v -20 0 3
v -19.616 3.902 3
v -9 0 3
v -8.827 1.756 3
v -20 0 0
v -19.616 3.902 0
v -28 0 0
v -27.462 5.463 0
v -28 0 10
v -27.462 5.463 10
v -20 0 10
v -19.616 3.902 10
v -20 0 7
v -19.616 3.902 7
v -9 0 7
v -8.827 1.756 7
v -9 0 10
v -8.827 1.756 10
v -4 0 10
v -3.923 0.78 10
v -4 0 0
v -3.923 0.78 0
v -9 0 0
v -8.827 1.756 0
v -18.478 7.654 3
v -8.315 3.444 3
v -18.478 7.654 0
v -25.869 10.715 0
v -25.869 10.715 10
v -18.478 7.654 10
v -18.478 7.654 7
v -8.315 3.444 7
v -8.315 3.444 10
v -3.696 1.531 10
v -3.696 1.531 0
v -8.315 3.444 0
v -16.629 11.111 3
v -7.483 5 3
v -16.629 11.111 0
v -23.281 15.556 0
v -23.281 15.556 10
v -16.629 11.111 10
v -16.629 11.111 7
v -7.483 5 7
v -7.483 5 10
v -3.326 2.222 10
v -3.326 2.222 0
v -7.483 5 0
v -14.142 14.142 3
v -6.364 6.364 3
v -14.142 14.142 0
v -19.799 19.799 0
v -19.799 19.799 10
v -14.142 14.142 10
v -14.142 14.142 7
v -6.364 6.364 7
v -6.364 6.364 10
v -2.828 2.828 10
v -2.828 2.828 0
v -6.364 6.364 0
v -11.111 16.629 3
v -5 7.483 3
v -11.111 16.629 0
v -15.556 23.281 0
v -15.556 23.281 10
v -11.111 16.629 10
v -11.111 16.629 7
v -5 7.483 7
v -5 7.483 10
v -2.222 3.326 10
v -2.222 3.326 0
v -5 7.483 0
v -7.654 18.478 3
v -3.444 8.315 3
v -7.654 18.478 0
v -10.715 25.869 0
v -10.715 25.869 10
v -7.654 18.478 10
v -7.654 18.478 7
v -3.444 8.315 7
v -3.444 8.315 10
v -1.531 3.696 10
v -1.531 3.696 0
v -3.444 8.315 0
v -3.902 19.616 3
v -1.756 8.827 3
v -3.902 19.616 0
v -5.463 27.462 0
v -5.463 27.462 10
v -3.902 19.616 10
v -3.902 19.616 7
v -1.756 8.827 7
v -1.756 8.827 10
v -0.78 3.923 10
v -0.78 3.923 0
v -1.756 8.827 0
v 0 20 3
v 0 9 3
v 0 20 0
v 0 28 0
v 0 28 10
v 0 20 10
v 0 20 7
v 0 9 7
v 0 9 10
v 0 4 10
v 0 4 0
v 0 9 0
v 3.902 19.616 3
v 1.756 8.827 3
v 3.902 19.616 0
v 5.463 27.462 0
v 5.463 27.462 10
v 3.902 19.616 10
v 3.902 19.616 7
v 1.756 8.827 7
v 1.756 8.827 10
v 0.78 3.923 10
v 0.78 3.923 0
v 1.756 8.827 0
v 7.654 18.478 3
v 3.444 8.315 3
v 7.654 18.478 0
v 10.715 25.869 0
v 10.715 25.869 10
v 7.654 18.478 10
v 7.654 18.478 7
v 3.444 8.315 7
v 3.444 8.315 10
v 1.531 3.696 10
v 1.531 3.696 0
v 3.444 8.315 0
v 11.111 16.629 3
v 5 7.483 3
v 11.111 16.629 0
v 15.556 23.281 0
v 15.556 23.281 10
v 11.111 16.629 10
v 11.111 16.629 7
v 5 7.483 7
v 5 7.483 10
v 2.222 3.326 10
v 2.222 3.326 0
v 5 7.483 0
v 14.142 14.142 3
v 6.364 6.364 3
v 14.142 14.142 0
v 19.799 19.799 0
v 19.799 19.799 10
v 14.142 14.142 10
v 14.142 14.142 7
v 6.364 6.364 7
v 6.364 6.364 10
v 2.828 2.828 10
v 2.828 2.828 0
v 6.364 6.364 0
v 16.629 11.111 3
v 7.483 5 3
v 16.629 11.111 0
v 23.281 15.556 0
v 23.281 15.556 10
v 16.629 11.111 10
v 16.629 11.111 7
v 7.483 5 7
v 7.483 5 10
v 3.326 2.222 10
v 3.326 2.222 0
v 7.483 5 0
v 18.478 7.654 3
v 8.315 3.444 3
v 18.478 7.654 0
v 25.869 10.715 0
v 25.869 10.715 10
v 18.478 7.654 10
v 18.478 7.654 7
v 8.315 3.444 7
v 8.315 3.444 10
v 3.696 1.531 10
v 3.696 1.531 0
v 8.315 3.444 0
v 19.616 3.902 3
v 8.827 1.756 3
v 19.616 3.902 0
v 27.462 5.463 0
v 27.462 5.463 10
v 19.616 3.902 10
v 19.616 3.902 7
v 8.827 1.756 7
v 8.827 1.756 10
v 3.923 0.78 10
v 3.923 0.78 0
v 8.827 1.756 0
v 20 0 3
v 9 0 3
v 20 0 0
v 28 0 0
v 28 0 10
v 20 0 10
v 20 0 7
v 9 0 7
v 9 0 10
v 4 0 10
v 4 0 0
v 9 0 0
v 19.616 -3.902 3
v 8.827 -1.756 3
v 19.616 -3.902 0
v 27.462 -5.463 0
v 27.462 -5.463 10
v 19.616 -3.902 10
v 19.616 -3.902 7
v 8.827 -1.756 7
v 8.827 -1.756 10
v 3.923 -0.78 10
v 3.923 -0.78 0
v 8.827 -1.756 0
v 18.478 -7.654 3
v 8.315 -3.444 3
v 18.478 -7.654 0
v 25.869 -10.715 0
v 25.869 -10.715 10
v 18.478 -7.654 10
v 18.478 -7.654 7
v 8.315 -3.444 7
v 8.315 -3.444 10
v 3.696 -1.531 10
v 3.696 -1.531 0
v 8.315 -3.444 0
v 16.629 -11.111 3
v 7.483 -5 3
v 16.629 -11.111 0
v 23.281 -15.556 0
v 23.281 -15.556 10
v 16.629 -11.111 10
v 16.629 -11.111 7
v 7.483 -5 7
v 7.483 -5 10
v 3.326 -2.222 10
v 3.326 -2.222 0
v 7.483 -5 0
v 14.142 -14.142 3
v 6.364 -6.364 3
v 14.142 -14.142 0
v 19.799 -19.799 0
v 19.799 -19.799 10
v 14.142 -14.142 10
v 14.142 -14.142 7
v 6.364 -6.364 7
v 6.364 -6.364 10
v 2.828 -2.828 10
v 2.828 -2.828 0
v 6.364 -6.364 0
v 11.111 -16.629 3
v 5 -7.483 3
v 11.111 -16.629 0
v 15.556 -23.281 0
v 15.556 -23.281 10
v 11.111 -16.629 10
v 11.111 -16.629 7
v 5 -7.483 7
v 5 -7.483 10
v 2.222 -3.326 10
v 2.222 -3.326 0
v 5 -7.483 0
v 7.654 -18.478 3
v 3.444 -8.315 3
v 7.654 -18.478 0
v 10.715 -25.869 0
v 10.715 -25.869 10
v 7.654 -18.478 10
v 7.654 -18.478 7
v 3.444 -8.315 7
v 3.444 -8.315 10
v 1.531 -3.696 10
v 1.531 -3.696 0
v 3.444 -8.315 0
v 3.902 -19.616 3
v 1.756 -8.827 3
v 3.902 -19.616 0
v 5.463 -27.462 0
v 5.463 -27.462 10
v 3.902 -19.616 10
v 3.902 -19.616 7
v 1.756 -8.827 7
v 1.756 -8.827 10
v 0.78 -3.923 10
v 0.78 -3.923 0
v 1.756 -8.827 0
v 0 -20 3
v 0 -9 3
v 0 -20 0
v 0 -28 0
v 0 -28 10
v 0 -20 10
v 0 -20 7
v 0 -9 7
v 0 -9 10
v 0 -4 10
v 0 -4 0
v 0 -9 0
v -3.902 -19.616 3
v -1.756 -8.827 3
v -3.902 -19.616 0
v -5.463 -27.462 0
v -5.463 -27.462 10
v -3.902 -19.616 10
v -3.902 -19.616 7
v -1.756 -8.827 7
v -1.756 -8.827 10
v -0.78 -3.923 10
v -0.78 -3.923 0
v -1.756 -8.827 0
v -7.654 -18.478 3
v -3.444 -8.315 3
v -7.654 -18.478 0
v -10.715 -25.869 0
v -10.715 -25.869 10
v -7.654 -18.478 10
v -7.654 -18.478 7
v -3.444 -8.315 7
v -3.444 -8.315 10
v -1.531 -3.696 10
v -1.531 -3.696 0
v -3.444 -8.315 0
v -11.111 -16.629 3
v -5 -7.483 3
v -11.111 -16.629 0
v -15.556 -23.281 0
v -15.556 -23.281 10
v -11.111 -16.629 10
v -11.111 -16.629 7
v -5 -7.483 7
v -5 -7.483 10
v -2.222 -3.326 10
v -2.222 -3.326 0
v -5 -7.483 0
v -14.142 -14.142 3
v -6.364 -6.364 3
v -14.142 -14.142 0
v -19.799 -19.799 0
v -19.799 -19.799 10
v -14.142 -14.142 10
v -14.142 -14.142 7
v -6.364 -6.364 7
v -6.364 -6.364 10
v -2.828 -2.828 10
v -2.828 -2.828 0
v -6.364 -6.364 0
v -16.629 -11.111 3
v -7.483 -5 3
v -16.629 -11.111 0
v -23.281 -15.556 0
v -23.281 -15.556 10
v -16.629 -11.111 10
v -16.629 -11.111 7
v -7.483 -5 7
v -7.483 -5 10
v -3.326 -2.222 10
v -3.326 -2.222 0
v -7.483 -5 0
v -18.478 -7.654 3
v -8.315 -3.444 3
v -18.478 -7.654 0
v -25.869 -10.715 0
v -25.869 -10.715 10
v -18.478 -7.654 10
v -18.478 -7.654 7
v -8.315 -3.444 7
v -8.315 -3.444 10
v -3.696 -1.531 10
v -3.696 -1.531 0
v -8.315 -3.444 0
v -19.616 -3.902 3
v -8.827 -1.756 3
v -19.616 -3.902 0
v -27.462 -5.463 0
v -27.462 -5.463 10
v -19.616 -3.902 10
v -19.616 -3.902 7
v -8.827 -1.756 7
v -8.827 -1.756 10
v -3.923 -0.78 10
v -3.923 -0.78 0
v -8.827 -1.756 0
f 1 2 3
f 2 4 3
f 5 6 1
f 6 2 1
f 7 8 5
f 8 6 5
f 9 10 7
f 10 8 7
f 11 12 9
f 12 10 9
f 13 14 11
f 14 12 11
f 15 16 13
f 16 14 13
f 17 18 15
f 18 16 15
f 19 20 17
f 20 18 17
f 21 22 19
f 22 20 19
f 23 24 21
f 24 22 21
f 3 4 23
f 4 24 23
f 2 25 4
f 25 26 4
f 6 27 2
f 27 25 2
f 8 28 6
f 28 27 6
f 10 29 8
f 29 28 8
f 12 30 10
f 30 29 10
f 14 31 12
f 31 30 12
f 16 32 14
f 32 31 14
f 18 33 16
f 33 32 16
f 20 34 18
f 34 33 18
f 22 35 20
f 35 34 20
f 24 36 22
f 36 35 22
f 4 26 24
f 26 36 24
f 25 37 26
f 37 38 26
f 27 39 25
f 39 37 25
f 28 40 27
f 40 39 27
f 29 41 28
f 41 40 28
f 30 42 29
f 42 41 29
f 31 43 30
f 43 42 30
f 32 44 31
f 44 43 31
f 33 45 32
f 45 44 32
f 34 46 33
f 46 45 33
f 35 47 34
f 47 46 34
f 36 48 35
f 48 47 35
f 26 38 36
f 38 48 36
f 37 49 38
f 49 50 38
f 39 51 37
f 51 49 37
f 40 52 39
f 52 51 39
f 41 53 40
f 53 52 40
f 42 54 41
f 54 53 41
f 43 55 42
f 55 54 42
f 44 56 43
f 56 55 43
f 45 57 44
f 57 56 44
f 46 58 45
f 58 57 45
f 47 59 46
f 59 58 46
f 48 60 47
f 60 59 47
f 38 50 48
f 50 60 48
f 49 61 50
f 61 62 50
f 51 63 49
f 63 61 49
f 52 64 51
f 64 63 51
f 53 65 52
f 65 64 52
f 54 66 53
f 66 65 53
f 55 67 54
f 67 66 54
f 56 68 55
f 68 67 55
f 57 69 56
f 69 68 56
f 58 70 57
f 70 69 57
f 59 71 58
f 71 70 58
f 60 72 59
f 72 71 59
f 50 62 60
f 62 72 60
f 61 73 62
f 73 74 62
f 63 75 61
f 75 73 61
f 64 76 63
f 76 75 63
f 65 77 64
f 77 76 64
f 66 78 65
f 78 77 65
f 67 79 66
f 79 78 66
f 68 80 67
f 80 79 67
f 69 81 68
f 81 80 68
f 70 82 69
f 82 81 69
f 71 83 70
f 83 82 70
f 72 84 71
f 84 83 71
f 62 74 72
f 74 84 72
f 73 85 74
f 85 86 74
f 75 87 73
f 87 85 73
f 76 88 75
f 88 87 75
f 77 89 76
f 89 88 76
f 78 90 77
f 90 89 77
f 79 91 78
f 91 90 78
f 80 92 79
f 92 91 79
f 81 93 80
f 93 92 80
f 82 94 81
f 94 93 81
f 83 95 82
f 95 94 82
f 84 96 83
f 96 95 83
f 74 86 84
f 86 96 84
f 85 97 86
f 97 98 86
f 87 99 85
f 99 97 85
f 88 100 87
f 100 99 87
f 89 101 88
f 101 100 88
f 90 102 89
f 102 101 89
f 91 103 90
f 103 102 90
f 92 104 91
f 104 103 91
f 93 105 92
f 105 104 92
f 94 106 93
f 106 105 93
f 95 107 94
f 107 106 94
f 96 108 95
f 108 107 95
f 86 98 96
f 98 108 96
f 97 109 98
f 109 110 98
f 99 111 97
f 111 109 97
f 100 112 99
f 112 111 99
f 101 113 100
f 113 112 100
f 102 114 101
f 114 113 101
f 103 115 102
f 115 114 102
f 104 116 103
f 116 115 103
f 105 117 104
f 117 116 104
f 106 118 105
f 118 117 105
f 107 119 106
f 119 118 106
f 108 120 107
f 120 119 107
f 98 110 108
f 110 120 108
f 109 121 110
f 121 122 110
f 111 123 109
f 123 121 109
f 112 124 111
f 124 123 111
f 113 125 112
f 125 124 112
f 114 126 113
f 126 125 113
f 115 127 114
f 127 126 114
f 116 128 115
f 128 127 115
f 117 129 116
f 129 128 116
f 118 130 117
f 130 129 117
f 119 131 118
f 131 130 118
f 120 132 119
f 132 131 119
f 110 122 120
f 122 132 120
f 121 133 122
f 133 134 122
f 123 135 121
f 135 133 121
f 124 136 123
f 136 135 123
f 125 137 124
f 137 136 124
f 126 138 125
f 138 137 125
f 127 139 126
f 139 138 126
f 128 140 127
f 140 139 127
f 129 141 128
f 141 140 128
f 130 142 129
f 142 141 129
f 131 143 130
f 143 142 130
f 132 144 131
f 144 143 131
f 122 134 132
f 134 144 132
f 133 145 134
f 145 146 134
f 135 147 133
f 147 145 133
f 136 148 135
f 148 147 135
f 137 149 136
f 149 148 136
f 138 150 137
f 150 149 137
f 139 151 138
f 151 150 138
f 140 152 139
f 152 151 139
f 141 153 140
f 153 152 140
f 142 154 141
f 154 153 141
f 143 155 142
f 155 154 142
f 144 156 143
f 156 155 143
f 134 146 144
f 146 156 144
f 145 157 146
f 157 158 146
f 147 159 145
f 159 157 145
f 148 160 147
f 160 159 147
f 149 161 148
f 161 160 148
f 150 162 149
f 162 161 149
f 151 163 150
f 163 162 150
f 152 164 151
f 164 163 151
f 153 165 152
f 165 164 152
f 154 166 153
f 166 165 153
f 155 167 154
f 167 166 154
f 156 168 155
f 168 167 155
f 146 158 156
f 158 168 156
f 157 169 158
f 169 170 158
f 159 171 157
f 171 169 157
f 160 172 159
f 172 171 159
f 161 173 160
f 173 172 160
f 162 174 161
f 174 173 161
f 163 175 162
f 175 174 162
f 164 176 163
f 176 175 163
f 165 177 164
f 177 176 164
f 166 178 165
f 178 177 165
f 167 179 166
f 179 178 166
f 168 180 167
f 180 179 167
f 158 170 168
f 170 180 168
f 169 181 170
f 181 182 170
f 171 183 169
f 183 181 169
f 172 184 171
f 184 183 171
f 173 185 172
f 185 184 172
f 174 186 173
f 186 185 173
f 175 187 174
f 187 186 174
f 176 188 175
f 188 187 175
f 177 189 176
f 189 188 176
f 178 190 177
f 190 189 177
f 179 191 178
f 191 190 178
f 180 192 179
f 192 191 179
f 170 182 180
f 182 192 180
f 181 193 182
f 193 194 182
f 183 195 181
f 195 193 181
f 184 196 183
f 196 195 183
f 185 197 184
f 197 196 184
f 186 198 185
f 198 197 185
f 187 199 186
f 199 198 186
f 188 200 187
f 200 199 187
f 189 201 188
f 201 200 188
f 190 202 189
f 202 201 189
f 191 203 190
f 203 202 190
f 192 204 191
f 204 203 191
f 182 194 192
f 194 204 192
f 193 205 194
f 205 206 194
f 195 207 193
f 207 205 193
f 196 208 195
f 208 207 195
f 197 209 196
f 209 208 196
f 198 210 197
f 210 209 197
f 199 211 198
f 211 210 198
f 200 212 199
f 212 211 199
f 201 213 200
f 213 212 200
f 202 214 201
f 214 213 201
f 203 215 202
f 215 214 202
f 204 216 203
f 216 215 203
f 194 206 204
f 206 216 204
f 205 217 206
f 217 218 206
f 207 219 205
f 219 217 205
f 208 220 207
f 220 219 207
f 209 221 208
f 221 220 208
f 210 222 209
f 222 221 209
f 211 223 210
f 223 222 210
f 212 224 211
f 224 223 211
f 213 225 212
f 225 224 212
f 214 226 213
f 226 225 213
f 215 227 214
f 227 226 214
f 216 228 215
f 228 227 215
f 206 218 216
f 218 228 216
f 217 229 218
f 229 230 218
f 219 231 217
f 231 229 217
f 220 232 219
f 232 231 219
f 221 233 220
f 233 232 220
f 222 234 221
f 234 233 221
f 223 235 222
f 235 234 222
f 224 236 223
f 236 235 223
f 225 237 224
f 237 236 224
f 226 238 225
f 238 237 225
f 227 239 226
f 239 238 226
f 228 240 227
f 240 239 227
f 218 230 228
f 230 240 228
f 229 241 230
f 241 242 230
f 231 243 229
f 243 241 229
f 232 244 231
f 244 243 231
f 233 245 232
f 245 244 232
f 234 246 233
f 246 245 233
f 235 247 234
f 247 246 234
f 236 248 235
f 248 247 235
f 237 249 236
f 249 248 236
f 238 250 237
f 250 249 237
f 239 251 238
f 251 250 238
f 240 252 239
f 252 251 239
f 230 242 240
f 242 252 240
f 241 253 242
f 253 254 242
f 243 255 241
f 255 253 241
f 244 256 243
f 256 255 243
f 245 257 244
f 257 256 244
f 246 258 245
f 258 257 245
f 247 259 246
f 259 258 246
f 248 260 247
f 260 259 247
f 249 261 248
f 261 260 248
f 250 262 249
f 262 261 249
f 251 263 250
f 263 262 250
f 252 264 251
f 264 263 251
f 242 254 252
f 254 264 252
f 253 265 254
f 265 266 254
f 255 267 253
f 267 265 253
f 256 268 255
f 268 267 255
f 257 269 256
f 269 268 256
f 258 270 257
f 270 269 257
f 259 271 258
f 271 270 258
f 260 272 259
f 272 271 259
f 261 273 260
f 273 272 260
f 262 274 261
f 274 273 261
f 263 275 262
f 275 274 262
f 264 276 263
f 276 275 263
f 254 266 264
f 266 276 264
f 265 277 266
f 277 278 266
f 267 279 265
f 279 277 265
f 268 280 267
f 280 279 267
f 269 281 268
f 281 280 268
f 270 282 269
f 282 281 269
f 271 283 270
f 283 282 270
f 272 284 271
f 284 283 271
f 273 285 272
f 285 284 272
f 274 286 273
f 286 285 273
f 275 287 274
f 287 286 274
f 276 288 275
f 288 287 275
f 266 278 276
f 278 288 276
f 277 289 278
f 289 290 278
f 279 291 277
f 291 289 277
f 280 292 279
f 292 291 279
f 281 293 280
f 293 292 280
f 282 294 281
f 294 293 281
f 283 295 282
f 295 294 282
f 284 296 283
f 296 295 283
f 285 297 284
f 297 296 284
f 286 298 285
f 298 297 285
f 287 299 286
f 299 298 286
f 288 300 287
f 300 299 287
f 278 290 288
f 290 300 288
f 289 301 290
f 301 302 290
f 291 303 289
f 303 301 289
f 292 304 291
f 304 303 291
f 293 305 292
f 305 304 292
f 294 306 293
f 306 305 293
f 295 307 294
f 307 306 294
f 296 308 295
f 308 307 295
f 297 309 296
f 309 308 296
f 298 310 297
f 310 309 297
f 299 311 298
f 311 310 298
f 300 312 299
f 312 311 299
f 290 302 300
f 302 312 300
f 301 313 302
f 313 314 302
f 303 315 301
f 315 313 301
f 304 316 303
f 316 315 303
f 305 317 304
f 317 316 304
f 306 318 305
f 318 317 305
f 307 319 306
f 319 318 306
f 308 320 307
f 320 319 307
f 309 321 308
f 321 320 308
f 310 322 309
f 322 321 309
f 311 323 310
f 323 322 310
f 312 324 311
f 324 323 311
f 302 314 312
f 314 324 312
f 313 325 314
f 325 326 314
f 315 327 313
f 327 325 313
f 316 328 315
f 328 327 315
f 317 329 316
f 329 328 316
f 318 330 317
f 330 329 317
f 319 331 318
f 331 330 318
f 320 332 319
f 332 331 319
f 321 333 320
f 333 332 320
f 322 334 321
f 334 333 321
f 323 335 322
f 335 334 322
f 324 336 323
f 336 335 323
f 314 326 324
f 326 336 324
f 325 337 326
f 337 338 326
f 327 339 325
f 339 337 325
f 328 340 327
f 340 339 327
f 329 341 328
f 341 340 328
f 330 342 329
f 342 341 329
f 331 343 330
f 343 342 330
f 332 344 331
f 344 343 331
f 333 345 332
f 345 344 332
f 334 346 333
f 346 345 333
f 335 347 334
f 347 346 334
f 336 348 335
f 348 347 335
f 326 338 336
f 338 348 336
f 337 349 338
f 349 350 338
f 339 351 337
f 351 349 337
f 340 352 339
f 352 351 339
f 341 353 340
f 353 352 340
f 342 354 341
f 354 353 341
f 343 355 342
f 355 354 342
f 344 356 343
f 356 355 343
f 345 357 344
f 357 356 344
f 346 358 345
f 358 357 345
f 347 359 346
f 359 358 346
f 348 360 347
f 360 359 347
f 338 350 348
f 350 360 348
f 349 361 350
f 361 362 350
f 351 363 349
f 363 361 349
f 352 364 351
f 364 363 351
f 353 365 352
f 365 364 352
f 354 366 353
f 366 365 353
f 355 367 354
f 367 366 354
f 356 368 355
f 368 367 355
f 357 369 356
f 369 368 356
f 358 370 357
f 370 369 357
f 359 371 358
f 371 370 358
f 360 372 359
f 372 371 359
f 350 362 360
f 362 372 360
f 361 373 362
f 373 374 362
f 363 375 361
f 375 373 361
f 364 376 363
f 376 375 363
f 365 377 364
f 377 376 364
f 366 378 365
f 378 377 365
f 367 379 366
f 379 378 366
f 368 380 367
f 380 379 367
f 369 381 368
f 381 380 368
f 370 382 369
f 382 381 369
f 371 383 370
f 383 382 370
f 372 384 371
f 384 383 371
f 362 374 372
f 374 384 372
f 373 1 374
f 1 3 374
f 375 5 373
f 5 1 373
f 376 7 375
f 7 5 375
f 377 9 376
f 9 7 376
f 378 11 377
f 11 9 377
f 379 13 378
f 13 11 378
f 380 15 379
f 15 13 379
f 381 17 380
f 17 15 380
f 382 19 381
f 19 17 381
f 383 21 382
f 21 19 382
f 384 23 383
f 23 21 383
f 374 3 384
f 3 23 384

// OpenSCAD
$fn = 32;

// ----------------------------------------------------------------------
// Revolved part: handwheel R28
// ----------------------------------------------------------------------

// --- parameters (mm) ---
bore_r = 4;               // bore radius
rim_r = 28;               // rim radius
rim_w = 8;                // rim axial width
rim_t = 10;               // rim diameter height
hub_r = 9;                // hub radius
web_t = 4;                // web thickness
revolve_angle = 360;      // revolve sweep, degrees

bore_d = 2 * bore_r;
rim_d = 2 * rim_r;
hub_d = 2 * hub_r;

profile = [[4, 0], [9, 0], [9, 3], [20, 3], [20, 0], [28, 0], [28, 10], [20, 10], [20, 7], [9, 7], [9, 10], [4, 10]];  // primary outline, 12 points, counter clockwise

// --- the one profile operation ---
rotate_extrude(angle = revolve_angle) polygon(points = profile);
